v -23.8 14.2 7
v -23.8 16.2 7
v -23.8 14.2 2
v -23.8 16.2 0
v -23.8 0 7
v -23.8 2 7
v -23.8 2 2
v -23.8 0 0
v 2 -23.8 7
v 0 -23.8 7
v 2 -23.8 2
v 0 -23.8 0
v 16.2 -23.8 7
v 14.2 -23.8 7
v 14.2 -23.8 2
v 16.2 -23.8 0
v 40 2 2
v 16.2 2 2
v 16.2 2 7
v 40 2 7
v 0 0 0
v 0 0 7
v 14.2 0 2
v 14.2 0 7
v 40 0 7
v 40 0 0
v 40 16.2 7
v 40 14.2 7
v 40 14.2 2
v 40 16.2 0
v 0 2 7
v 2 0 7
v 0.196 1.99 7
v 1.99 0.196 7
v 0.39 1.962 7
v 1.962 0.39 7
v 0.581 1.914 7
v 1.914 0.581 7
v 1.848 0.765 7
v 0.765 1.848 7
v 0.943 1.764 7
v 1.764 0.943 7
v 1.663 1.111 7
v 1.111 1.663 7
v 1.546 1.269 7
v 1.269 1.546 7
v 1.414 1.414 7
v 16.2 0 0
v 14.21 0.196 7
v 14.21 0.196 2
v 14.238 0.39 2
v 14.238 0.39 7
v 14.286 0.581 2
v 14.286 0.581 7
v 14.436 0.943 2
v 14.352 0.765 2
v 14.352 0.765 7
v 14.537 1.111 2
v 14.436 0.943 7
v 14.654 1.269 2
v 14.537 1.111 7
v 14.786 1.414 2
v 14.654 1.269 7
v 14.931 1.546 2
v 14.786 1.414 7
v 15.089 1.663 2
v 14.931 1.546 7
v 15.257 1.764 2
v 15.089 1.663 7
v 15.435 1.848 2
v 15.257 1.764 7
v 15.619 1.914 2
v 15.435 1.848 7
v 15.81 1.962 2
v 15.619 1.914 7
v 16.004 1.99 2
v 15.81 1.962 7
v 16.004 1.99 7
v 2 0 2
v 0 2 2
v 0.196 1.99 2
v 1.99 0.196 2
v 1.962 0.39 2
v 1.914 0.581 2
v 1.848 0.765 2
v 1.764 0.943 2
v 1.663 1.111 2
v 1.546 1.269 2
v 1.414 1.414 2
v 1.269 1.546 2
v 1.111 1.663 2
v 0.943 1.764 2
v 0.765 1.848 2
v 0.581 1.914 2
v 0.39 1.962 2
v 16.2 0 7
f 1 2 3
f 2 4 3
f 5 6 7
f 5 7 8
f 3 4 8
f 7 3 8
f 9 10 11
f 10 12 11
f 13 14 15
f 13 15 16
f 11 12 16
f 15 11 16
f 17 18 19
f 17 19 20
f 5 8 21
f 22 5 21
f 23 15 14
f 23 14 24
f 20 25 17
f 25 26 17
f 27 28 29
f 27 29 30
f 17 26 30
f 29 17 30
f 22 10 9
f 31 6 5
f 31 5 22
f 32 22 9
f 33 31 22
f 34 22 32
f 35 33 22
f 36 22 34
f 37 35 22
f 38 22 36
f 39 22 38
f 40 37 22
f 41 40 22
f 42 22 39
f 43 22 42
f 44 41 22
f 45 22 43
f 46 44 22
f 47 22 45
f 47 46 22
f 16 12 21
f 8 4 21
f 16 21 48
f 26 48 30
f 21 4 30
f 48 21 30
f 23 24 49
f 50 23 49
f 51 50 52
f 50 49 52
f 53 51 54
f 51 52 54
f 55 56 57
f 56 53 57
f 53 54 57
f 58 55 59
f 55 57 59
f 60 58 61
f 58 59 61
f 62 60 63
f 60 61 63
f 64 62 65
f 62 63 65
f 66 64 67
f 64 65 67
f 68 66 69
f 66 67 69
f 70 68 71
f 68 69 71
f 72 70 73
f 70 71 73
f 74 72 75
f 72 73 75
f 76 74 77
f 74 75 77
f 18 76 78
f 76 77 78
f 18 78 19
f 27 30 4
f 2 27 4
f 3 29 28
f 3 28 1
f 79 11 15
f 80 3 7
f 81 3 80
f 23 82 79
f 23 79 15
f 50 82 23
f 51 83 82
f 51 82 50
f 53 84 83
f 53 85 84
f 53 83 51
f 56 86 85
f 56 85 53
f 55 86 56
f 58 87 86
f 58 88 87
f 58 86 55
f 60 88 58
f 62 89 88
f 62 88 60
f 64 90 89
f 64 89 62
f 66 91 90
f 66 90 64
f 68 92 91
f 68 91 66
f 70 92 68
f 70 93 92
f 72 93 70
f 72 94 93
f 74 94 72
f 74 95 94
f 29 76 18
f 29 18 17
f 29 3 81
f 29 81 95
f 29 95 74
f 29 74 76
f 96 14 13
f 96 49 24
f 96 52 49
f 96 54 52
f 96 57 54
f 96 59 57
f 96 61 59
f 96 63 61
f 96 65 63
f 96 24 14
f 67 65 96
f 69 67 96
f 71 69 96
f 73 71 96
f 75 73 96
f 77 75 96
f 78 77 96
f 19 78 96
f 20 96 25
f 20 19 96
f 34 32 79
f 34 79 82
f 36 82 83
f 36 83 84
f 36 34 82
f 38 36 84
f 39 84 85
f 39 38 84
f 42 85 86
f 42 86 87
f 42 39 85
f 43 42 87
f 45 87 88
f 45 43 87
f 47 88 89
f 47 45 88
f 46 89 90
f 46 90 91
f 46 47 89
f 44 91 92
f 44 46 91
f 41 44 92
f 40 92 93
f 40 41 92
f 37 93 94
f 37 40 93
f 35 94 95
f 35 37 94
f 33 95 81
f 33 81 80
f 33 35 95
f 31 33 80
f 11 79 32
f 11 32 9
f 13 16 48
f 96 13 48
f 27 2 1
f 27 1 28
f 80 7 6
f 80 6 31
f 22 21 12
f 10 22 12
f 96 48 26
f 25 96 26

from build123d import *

# Parameters (mm, degrees)
PAD_DEPTH   = 7
THICKNESS_T = -2


with BuildPart() as part:
    # Sketch001 → Pad (new body)
    with BuildSketch(Plane.XY):
        Polygon((0, 0), (0, -23.8), (16.2, -23.8), (16.2, 0), (40, 0), (40, 16.2), (-23.8, 16.2), (-23.8, 0), align=None)
    extrude(amount=PAD_DEPTH)

    # Thickness
    thickness_openings = [part.faces().sort_by_distance(p)[0] for p in [
        (8.1, 2.66621, 7),
        (8.1, -23.8, 3.5),
        (40, 8.1, 3.5),
        (-23.8, 8.1, 3.5),
    ]]
    offset(amount=THICKNESS_T, openings=thickness_openings)


solid = part.part
